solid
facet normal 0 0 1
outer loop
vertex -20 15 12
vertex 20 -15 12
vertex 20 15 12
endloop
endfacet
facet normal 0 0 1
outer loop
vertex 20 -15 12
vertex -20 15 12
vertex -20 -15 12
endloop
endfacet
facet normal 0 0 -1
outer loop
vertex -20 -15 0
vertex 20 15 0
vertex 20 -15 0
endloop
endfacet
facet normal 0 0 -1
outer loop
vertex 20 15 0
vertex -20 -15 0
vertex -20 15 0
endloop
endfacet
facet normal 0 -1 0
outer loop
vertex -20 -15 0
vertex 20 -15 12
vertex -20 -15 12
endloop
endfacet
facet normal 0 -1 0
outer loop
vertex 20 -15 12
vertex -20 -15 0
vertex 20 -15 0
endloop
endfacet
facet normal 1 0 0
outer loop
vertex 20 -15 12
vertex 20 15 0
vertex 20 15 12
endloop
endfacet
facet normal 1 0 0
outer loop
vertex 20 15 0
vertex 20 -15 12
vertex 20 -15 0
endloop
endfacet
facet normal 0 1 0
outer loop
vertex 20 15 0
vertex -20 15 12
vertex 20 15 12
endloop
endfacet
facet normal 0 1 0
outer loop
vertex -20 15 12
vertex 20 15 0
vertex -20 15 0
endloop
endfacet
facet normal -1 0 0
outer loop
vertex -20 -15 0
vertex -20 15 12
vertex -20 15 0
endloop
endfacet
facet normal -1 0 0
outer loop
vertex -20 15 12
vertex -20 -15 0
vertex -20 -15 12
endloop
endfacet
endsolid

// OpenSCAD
// A plain 40 x 30 x 12 box centred on the plate, resting on z = 0.
translate([-20, -15, 0]) cube([40, 30, 12]);
